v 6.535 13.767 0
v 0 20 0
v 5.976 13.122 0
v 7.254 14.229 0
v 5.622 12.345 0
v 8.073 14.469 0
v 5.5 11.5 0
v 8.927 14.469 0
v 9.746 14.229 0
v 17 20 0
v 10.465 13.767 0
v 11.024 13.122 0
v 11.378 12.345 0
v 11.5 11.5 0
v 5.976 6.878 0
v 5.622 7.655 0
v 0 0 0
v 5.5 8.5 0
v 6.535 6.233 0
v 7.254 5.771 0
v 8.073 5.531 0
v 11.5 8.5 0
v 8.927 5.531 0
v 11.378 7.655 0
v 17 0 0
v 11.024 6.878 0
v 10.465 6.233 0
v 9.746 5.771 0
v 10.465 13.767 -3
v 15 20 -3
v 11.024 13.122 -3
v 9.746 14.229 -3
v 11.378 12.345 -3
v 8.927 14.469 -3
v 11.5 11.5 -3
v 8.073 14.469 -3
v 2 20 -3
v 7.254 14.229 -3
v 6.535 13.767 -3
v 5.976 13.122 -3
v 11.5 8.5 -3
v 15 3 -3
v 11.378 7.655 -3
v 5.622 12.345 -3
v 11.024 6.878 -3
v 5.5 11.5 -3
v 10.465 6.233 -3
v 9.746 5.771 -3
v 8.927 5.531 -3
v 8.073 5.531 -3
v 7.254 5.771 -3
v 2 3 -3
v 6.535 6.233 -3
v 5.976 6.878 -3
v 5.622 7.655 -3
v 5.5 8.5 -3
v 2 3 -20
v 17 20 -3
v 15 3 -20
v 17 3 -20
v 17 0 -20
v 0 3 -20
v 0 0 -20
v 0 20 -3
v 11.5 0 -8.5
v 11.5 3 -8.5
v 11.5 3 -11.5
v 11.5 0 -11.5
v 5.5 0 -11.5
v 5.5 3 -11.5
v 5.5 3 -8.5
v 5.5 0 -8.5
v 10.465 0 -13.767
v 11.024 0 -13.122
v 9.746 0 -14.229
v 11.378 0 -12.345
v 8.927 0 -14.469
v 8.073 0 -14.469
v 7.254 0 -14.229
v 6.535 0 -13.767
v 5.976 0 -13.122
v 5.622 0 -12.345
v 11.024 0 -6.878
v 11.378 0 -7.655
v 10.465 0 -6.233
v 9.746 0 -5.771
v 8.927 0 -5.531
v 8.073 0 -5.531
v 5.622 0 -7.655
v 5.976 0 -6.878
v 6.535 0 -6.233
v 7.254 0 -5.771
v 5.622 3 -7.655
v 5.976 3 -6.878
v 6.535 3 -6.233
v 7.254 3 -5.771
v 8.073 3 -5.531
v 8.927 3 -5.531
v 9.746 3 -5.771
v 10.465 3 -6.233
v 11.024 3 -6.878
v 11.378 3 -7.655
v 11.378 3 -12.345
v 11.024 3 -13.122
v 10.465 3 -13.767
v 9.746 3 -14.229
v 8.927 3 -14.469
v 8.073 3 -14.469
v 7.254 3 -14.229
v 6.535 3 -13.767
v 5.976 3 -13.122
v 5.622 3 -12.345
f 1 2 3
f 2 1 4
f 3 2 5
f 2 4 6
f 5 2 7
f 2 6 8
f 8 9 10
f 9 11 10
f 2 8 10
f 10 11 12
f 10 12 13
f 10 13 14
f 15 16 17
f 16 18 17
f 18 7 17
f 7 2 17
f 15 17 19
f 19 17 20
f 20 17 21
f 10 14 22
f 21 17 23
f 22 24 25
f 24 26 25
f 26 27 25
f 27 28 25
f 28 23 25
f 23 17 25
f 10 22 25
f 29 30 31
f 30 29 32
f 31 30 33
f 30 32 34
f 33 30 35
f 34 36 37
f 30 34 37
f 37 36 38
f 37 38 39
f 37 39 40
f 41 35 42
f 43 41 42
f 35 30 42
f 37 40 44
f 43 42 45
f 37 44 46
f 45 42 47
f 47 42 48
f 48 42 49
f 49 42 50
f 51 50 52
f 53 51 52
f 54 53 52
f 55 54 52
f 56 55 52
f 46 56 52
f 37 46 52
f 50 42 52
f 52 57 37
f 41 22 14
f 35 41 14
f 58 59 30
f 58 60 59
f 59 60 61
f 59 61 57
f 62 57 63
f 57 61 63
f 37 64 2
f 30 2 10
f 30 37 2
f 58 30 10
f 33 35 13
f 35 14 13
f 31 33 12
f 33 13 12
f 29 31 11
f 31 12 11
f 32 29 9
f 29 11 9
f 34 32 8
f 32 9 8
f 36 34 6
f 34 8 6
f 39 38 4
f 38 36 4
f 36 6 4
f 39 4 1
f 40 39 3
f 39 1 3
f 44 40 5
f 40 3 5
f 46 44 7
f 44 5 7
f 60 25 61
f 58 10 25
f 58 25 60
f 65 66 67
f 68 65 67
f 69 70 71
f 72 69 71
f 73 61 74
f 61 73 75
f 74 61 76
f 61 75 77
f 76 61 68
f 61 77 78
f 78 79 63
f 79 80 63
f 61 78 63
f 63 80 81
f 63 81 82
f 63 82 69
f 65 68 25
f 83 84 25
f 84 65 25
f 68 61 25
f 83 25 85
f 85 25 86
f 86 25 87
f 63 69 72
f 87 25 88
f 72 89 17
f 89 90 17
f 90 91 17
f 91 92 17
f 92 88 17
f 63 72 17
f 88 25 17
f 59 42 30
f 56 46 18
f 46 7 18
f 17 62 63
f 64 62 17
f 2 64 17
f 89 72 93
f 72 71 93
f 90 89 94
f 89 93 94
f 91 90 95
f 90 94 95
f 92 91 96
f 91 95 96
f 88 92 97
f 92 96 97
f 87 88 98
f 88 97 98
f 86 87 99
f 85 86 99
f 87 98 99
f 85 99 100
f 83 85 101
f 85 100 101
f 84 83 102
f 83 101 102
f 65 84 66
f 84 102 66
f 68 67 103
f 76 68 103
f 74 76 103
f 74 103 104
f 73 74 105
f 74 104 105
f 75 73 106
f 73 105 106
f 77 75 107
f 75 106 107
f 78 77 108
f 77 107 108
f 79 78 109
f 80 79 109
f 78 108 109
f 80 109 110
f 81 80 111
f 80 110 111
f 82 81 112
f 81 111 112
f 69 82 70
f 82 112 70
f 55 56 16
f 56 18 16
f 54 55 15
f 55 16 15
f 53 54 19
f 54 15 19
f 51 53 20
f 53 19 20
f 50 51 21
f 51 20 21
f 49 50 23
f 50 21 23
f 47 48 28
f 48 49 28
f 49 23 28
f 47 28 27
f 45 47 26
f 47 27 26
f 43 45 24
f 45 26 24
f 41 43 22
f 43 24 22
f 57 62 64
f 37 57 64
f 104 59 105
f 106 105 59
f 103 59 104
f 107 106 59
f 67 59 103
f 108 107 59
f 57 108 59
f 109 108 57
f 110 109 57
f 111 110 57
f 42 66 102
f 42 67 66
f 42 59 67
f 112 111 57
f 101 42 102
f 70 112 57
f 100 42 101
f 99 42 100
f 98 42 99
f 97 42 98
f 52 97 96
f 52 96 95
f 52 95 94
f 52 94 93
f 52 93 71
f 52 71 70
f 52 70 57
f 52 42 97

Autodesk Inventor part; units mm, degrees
ref_plane "YZ Plane" through (0, 0, 0) normal (1, 0, 0) x (0, 1, 0)
ref_plane "XZ Plane" through (0, 0, 0) normal (0, 1, 0) x (-1, 0, 0)
ref_plane "XY Plane" through (0, 0, 0) normal (0, 0, 1) x (1, 0, 0)
sketch "Sketch1" plane through (0, 0, 0) normal (0, 1, 0) x (-1, 0, 0)
  line L0 (0, 0) -> (-17, 0)
  line L1 (-17, 0) -> (-17, -20)
  line L2 (-17, -20) -> (0, -20)
  line L3 (0, -20) -> (0, 0)
  dimension "d0" = 17
  dimension "d1" = 20
extrude "Extrusion1" add sketch "Sketch1" along normal blind 3
sketch "Sketch2" plane through (0, 3, 0) normal (0, 1, 0) x (1, 0, 0)
  line L0 (17, 0) -> (17, 20) projected
  line L1 (17, 20) -> (0, 20) projected
  line L2 (0, 20) -> (0, 0) projected
  line L3 (0, 0) -> (17, 0) projected
  line L4 (8.5, 14.5) -> (8.5, 14.5)
  line L5 (5.5, 11.5) -> (5.5, 8.5)
  line L6 (8.5, 5.5) -> (8.5, 5.5)
  line L7 (11.5, 8.5) -> (11.5, 11.5)
  arc A0 (8.5, 14.5) -> (5.5, 11.5) centre (8.5, 11.5) ccw
  arc A1 (11.5, 11.5) -> (8.5, 14.5) centre (8.5, 11.5) ccw
  arc A2 (5.5, 8.5) -> (8.5, 5.5) centre (8.5, 8.5) ccw
  arc A3 (8.5, 5.5) -> (11.5, 8.5) centre (8.5, 8.5) ccw
  point P0 (5.5, 5.5)
  point P1 (5.5, 14.5)
  point P2 (11.5, 5.5)
  dimension "d6" = 6
  dimension "d7" = 9
  dimension "d8" = 3
extrude "Extrusion2" cut sketch "Sketch2" against normal blind 3 contours A0 A1 L7 A3 A2 L5
sketch "Sketch3" plane through (0, 3, 0) normal (0, 1, 0) x (1, 0, 0)
  line L0 (11.5, 11.5) -> (11.5, 8.5) projected
  arc A0 (5.5, 8.5) -> (11.5, 8.5) centre (8.5, 8.5) ccw projected
  line L1 (5.5, 8.5) -> (5.5, 11.5) projected
  arc A1 (11.5, 11.5) -> (5.5, 11.5) centre (8.5, 11.5) ccw projected
  line L2 (17, 0) -> (17, 20) projected
  line L3 (17, 20) -> (0, 20) projected
  line L4 (0, 20) -> (0, 0) projected
  line L5 (0, 0) -> (17, 0) projected
  line L6 (0, 20) -> (0, 0) projected
  line L7 (0, 0) -> (17, 0)
  line L8 (17, 0) -> (17, 3)
  line L9 (17, 3) -> (0, 3)
  line L10 (0, 3) -> (0, 0)
  dimension "d11" = 3
extrude "Extrusion3" add sketch "Sketch3" along normal blind 17 contours L5 L4 L9 L2
sketch "Sketch4" plane through (0, 0, 0) normal (0, 0, 1) x (1, 0, 0)
  line L0 (0, 0) -> (17, 0) projected
  line L1 (17, 0) -> (17, 20) projected
  line L2 (0, 20) -> (17, 20) projected
  line L3 (0, 0) -> (0, 20) projected
  line L4 (8.5, 5.5) -> (8.5, 5.5)
  line L5 (11.5, 8.5) -> (11.5, 11.5)
  line L6 (8.5, 14.5) -> (8.5, 14.5)
  line L7 (5.5, 11.5) -> (5.5, 8.5)
  line L8 (5.5, 5.5) -> (11.5, 14.5) construction
  line L9 (11.5, 5.5) -> (5.5, 14.5) construction
  arc A0 (8.5, 14.5) -> (5.5, 11.5) centre (8.5, 11.5) ccw
  arc A1 (11.5, 11.5) -> (8.5, 14.5) centre (8.5, 11.5) ccw
  arc A2 (5.5, 8.5) -> (8.5, 5.5) centre (8.5, 8.5) ccw
  arc A3 (8.5, 5.5) -> (11.5, 8.5) centre (8.5, 8.5) ccw
  point P0 (8.5, 10)
  dimension "d14" = 6
  dimension "d15" = 9
  dimension "d16" = 3
extrude "Extrusion4" cut sketch "Sketch4" against normal blind 3 contours A3 A2 L7 A0 A1 L5
sketch "Sketch5" plane through (17, 0, 0) normal (1, 0, 0) x (0, 0, -1)
  line L0 (0, 0) -> (20, 0) projected
  line L1 (20, 0) -> (20, 3) projected
  line L2 (3, 3) -> (20, 3) projected
  line L3 (3, 3) -> (3, 20) projected
  line L4 (0, 20) -> (3, 20) projected
  line L5 (0, 0) -> (0, 20) projected
  line L6 (20, 3) -> (3, 20)
extrude "Extrusion5" add sketch "Sketch5" against normal blind 2 contours L2 L3 L6
sketch "Sketch6" plane through (0, 0, -20) normal (-1, 0, 0) x (0, 0, 1)
  line L0 (17, 3) -> (0, 3) projected
  line L1 (17, 3) -> (17, 20) projected
  line L2 (0, 3) -> (17, 20)
  line L3 (0, 0) -> (20, 0) projected
  line L4 (20, 0) -> (20, 20) projected
  line L5 (17, 20) -> (20, 20) projected
  line L6 (17, 3) -> (17, 20) projected
  line L7 (0, 3) -> (17, 3) projected
  line L8 (0, 0) -> (0, 3) projected
extrude "Extrusion6" add sketch "Sketch6" against normal blind 2 contours L0 L2 L1
properties part number "ANGULOESQUINA"
